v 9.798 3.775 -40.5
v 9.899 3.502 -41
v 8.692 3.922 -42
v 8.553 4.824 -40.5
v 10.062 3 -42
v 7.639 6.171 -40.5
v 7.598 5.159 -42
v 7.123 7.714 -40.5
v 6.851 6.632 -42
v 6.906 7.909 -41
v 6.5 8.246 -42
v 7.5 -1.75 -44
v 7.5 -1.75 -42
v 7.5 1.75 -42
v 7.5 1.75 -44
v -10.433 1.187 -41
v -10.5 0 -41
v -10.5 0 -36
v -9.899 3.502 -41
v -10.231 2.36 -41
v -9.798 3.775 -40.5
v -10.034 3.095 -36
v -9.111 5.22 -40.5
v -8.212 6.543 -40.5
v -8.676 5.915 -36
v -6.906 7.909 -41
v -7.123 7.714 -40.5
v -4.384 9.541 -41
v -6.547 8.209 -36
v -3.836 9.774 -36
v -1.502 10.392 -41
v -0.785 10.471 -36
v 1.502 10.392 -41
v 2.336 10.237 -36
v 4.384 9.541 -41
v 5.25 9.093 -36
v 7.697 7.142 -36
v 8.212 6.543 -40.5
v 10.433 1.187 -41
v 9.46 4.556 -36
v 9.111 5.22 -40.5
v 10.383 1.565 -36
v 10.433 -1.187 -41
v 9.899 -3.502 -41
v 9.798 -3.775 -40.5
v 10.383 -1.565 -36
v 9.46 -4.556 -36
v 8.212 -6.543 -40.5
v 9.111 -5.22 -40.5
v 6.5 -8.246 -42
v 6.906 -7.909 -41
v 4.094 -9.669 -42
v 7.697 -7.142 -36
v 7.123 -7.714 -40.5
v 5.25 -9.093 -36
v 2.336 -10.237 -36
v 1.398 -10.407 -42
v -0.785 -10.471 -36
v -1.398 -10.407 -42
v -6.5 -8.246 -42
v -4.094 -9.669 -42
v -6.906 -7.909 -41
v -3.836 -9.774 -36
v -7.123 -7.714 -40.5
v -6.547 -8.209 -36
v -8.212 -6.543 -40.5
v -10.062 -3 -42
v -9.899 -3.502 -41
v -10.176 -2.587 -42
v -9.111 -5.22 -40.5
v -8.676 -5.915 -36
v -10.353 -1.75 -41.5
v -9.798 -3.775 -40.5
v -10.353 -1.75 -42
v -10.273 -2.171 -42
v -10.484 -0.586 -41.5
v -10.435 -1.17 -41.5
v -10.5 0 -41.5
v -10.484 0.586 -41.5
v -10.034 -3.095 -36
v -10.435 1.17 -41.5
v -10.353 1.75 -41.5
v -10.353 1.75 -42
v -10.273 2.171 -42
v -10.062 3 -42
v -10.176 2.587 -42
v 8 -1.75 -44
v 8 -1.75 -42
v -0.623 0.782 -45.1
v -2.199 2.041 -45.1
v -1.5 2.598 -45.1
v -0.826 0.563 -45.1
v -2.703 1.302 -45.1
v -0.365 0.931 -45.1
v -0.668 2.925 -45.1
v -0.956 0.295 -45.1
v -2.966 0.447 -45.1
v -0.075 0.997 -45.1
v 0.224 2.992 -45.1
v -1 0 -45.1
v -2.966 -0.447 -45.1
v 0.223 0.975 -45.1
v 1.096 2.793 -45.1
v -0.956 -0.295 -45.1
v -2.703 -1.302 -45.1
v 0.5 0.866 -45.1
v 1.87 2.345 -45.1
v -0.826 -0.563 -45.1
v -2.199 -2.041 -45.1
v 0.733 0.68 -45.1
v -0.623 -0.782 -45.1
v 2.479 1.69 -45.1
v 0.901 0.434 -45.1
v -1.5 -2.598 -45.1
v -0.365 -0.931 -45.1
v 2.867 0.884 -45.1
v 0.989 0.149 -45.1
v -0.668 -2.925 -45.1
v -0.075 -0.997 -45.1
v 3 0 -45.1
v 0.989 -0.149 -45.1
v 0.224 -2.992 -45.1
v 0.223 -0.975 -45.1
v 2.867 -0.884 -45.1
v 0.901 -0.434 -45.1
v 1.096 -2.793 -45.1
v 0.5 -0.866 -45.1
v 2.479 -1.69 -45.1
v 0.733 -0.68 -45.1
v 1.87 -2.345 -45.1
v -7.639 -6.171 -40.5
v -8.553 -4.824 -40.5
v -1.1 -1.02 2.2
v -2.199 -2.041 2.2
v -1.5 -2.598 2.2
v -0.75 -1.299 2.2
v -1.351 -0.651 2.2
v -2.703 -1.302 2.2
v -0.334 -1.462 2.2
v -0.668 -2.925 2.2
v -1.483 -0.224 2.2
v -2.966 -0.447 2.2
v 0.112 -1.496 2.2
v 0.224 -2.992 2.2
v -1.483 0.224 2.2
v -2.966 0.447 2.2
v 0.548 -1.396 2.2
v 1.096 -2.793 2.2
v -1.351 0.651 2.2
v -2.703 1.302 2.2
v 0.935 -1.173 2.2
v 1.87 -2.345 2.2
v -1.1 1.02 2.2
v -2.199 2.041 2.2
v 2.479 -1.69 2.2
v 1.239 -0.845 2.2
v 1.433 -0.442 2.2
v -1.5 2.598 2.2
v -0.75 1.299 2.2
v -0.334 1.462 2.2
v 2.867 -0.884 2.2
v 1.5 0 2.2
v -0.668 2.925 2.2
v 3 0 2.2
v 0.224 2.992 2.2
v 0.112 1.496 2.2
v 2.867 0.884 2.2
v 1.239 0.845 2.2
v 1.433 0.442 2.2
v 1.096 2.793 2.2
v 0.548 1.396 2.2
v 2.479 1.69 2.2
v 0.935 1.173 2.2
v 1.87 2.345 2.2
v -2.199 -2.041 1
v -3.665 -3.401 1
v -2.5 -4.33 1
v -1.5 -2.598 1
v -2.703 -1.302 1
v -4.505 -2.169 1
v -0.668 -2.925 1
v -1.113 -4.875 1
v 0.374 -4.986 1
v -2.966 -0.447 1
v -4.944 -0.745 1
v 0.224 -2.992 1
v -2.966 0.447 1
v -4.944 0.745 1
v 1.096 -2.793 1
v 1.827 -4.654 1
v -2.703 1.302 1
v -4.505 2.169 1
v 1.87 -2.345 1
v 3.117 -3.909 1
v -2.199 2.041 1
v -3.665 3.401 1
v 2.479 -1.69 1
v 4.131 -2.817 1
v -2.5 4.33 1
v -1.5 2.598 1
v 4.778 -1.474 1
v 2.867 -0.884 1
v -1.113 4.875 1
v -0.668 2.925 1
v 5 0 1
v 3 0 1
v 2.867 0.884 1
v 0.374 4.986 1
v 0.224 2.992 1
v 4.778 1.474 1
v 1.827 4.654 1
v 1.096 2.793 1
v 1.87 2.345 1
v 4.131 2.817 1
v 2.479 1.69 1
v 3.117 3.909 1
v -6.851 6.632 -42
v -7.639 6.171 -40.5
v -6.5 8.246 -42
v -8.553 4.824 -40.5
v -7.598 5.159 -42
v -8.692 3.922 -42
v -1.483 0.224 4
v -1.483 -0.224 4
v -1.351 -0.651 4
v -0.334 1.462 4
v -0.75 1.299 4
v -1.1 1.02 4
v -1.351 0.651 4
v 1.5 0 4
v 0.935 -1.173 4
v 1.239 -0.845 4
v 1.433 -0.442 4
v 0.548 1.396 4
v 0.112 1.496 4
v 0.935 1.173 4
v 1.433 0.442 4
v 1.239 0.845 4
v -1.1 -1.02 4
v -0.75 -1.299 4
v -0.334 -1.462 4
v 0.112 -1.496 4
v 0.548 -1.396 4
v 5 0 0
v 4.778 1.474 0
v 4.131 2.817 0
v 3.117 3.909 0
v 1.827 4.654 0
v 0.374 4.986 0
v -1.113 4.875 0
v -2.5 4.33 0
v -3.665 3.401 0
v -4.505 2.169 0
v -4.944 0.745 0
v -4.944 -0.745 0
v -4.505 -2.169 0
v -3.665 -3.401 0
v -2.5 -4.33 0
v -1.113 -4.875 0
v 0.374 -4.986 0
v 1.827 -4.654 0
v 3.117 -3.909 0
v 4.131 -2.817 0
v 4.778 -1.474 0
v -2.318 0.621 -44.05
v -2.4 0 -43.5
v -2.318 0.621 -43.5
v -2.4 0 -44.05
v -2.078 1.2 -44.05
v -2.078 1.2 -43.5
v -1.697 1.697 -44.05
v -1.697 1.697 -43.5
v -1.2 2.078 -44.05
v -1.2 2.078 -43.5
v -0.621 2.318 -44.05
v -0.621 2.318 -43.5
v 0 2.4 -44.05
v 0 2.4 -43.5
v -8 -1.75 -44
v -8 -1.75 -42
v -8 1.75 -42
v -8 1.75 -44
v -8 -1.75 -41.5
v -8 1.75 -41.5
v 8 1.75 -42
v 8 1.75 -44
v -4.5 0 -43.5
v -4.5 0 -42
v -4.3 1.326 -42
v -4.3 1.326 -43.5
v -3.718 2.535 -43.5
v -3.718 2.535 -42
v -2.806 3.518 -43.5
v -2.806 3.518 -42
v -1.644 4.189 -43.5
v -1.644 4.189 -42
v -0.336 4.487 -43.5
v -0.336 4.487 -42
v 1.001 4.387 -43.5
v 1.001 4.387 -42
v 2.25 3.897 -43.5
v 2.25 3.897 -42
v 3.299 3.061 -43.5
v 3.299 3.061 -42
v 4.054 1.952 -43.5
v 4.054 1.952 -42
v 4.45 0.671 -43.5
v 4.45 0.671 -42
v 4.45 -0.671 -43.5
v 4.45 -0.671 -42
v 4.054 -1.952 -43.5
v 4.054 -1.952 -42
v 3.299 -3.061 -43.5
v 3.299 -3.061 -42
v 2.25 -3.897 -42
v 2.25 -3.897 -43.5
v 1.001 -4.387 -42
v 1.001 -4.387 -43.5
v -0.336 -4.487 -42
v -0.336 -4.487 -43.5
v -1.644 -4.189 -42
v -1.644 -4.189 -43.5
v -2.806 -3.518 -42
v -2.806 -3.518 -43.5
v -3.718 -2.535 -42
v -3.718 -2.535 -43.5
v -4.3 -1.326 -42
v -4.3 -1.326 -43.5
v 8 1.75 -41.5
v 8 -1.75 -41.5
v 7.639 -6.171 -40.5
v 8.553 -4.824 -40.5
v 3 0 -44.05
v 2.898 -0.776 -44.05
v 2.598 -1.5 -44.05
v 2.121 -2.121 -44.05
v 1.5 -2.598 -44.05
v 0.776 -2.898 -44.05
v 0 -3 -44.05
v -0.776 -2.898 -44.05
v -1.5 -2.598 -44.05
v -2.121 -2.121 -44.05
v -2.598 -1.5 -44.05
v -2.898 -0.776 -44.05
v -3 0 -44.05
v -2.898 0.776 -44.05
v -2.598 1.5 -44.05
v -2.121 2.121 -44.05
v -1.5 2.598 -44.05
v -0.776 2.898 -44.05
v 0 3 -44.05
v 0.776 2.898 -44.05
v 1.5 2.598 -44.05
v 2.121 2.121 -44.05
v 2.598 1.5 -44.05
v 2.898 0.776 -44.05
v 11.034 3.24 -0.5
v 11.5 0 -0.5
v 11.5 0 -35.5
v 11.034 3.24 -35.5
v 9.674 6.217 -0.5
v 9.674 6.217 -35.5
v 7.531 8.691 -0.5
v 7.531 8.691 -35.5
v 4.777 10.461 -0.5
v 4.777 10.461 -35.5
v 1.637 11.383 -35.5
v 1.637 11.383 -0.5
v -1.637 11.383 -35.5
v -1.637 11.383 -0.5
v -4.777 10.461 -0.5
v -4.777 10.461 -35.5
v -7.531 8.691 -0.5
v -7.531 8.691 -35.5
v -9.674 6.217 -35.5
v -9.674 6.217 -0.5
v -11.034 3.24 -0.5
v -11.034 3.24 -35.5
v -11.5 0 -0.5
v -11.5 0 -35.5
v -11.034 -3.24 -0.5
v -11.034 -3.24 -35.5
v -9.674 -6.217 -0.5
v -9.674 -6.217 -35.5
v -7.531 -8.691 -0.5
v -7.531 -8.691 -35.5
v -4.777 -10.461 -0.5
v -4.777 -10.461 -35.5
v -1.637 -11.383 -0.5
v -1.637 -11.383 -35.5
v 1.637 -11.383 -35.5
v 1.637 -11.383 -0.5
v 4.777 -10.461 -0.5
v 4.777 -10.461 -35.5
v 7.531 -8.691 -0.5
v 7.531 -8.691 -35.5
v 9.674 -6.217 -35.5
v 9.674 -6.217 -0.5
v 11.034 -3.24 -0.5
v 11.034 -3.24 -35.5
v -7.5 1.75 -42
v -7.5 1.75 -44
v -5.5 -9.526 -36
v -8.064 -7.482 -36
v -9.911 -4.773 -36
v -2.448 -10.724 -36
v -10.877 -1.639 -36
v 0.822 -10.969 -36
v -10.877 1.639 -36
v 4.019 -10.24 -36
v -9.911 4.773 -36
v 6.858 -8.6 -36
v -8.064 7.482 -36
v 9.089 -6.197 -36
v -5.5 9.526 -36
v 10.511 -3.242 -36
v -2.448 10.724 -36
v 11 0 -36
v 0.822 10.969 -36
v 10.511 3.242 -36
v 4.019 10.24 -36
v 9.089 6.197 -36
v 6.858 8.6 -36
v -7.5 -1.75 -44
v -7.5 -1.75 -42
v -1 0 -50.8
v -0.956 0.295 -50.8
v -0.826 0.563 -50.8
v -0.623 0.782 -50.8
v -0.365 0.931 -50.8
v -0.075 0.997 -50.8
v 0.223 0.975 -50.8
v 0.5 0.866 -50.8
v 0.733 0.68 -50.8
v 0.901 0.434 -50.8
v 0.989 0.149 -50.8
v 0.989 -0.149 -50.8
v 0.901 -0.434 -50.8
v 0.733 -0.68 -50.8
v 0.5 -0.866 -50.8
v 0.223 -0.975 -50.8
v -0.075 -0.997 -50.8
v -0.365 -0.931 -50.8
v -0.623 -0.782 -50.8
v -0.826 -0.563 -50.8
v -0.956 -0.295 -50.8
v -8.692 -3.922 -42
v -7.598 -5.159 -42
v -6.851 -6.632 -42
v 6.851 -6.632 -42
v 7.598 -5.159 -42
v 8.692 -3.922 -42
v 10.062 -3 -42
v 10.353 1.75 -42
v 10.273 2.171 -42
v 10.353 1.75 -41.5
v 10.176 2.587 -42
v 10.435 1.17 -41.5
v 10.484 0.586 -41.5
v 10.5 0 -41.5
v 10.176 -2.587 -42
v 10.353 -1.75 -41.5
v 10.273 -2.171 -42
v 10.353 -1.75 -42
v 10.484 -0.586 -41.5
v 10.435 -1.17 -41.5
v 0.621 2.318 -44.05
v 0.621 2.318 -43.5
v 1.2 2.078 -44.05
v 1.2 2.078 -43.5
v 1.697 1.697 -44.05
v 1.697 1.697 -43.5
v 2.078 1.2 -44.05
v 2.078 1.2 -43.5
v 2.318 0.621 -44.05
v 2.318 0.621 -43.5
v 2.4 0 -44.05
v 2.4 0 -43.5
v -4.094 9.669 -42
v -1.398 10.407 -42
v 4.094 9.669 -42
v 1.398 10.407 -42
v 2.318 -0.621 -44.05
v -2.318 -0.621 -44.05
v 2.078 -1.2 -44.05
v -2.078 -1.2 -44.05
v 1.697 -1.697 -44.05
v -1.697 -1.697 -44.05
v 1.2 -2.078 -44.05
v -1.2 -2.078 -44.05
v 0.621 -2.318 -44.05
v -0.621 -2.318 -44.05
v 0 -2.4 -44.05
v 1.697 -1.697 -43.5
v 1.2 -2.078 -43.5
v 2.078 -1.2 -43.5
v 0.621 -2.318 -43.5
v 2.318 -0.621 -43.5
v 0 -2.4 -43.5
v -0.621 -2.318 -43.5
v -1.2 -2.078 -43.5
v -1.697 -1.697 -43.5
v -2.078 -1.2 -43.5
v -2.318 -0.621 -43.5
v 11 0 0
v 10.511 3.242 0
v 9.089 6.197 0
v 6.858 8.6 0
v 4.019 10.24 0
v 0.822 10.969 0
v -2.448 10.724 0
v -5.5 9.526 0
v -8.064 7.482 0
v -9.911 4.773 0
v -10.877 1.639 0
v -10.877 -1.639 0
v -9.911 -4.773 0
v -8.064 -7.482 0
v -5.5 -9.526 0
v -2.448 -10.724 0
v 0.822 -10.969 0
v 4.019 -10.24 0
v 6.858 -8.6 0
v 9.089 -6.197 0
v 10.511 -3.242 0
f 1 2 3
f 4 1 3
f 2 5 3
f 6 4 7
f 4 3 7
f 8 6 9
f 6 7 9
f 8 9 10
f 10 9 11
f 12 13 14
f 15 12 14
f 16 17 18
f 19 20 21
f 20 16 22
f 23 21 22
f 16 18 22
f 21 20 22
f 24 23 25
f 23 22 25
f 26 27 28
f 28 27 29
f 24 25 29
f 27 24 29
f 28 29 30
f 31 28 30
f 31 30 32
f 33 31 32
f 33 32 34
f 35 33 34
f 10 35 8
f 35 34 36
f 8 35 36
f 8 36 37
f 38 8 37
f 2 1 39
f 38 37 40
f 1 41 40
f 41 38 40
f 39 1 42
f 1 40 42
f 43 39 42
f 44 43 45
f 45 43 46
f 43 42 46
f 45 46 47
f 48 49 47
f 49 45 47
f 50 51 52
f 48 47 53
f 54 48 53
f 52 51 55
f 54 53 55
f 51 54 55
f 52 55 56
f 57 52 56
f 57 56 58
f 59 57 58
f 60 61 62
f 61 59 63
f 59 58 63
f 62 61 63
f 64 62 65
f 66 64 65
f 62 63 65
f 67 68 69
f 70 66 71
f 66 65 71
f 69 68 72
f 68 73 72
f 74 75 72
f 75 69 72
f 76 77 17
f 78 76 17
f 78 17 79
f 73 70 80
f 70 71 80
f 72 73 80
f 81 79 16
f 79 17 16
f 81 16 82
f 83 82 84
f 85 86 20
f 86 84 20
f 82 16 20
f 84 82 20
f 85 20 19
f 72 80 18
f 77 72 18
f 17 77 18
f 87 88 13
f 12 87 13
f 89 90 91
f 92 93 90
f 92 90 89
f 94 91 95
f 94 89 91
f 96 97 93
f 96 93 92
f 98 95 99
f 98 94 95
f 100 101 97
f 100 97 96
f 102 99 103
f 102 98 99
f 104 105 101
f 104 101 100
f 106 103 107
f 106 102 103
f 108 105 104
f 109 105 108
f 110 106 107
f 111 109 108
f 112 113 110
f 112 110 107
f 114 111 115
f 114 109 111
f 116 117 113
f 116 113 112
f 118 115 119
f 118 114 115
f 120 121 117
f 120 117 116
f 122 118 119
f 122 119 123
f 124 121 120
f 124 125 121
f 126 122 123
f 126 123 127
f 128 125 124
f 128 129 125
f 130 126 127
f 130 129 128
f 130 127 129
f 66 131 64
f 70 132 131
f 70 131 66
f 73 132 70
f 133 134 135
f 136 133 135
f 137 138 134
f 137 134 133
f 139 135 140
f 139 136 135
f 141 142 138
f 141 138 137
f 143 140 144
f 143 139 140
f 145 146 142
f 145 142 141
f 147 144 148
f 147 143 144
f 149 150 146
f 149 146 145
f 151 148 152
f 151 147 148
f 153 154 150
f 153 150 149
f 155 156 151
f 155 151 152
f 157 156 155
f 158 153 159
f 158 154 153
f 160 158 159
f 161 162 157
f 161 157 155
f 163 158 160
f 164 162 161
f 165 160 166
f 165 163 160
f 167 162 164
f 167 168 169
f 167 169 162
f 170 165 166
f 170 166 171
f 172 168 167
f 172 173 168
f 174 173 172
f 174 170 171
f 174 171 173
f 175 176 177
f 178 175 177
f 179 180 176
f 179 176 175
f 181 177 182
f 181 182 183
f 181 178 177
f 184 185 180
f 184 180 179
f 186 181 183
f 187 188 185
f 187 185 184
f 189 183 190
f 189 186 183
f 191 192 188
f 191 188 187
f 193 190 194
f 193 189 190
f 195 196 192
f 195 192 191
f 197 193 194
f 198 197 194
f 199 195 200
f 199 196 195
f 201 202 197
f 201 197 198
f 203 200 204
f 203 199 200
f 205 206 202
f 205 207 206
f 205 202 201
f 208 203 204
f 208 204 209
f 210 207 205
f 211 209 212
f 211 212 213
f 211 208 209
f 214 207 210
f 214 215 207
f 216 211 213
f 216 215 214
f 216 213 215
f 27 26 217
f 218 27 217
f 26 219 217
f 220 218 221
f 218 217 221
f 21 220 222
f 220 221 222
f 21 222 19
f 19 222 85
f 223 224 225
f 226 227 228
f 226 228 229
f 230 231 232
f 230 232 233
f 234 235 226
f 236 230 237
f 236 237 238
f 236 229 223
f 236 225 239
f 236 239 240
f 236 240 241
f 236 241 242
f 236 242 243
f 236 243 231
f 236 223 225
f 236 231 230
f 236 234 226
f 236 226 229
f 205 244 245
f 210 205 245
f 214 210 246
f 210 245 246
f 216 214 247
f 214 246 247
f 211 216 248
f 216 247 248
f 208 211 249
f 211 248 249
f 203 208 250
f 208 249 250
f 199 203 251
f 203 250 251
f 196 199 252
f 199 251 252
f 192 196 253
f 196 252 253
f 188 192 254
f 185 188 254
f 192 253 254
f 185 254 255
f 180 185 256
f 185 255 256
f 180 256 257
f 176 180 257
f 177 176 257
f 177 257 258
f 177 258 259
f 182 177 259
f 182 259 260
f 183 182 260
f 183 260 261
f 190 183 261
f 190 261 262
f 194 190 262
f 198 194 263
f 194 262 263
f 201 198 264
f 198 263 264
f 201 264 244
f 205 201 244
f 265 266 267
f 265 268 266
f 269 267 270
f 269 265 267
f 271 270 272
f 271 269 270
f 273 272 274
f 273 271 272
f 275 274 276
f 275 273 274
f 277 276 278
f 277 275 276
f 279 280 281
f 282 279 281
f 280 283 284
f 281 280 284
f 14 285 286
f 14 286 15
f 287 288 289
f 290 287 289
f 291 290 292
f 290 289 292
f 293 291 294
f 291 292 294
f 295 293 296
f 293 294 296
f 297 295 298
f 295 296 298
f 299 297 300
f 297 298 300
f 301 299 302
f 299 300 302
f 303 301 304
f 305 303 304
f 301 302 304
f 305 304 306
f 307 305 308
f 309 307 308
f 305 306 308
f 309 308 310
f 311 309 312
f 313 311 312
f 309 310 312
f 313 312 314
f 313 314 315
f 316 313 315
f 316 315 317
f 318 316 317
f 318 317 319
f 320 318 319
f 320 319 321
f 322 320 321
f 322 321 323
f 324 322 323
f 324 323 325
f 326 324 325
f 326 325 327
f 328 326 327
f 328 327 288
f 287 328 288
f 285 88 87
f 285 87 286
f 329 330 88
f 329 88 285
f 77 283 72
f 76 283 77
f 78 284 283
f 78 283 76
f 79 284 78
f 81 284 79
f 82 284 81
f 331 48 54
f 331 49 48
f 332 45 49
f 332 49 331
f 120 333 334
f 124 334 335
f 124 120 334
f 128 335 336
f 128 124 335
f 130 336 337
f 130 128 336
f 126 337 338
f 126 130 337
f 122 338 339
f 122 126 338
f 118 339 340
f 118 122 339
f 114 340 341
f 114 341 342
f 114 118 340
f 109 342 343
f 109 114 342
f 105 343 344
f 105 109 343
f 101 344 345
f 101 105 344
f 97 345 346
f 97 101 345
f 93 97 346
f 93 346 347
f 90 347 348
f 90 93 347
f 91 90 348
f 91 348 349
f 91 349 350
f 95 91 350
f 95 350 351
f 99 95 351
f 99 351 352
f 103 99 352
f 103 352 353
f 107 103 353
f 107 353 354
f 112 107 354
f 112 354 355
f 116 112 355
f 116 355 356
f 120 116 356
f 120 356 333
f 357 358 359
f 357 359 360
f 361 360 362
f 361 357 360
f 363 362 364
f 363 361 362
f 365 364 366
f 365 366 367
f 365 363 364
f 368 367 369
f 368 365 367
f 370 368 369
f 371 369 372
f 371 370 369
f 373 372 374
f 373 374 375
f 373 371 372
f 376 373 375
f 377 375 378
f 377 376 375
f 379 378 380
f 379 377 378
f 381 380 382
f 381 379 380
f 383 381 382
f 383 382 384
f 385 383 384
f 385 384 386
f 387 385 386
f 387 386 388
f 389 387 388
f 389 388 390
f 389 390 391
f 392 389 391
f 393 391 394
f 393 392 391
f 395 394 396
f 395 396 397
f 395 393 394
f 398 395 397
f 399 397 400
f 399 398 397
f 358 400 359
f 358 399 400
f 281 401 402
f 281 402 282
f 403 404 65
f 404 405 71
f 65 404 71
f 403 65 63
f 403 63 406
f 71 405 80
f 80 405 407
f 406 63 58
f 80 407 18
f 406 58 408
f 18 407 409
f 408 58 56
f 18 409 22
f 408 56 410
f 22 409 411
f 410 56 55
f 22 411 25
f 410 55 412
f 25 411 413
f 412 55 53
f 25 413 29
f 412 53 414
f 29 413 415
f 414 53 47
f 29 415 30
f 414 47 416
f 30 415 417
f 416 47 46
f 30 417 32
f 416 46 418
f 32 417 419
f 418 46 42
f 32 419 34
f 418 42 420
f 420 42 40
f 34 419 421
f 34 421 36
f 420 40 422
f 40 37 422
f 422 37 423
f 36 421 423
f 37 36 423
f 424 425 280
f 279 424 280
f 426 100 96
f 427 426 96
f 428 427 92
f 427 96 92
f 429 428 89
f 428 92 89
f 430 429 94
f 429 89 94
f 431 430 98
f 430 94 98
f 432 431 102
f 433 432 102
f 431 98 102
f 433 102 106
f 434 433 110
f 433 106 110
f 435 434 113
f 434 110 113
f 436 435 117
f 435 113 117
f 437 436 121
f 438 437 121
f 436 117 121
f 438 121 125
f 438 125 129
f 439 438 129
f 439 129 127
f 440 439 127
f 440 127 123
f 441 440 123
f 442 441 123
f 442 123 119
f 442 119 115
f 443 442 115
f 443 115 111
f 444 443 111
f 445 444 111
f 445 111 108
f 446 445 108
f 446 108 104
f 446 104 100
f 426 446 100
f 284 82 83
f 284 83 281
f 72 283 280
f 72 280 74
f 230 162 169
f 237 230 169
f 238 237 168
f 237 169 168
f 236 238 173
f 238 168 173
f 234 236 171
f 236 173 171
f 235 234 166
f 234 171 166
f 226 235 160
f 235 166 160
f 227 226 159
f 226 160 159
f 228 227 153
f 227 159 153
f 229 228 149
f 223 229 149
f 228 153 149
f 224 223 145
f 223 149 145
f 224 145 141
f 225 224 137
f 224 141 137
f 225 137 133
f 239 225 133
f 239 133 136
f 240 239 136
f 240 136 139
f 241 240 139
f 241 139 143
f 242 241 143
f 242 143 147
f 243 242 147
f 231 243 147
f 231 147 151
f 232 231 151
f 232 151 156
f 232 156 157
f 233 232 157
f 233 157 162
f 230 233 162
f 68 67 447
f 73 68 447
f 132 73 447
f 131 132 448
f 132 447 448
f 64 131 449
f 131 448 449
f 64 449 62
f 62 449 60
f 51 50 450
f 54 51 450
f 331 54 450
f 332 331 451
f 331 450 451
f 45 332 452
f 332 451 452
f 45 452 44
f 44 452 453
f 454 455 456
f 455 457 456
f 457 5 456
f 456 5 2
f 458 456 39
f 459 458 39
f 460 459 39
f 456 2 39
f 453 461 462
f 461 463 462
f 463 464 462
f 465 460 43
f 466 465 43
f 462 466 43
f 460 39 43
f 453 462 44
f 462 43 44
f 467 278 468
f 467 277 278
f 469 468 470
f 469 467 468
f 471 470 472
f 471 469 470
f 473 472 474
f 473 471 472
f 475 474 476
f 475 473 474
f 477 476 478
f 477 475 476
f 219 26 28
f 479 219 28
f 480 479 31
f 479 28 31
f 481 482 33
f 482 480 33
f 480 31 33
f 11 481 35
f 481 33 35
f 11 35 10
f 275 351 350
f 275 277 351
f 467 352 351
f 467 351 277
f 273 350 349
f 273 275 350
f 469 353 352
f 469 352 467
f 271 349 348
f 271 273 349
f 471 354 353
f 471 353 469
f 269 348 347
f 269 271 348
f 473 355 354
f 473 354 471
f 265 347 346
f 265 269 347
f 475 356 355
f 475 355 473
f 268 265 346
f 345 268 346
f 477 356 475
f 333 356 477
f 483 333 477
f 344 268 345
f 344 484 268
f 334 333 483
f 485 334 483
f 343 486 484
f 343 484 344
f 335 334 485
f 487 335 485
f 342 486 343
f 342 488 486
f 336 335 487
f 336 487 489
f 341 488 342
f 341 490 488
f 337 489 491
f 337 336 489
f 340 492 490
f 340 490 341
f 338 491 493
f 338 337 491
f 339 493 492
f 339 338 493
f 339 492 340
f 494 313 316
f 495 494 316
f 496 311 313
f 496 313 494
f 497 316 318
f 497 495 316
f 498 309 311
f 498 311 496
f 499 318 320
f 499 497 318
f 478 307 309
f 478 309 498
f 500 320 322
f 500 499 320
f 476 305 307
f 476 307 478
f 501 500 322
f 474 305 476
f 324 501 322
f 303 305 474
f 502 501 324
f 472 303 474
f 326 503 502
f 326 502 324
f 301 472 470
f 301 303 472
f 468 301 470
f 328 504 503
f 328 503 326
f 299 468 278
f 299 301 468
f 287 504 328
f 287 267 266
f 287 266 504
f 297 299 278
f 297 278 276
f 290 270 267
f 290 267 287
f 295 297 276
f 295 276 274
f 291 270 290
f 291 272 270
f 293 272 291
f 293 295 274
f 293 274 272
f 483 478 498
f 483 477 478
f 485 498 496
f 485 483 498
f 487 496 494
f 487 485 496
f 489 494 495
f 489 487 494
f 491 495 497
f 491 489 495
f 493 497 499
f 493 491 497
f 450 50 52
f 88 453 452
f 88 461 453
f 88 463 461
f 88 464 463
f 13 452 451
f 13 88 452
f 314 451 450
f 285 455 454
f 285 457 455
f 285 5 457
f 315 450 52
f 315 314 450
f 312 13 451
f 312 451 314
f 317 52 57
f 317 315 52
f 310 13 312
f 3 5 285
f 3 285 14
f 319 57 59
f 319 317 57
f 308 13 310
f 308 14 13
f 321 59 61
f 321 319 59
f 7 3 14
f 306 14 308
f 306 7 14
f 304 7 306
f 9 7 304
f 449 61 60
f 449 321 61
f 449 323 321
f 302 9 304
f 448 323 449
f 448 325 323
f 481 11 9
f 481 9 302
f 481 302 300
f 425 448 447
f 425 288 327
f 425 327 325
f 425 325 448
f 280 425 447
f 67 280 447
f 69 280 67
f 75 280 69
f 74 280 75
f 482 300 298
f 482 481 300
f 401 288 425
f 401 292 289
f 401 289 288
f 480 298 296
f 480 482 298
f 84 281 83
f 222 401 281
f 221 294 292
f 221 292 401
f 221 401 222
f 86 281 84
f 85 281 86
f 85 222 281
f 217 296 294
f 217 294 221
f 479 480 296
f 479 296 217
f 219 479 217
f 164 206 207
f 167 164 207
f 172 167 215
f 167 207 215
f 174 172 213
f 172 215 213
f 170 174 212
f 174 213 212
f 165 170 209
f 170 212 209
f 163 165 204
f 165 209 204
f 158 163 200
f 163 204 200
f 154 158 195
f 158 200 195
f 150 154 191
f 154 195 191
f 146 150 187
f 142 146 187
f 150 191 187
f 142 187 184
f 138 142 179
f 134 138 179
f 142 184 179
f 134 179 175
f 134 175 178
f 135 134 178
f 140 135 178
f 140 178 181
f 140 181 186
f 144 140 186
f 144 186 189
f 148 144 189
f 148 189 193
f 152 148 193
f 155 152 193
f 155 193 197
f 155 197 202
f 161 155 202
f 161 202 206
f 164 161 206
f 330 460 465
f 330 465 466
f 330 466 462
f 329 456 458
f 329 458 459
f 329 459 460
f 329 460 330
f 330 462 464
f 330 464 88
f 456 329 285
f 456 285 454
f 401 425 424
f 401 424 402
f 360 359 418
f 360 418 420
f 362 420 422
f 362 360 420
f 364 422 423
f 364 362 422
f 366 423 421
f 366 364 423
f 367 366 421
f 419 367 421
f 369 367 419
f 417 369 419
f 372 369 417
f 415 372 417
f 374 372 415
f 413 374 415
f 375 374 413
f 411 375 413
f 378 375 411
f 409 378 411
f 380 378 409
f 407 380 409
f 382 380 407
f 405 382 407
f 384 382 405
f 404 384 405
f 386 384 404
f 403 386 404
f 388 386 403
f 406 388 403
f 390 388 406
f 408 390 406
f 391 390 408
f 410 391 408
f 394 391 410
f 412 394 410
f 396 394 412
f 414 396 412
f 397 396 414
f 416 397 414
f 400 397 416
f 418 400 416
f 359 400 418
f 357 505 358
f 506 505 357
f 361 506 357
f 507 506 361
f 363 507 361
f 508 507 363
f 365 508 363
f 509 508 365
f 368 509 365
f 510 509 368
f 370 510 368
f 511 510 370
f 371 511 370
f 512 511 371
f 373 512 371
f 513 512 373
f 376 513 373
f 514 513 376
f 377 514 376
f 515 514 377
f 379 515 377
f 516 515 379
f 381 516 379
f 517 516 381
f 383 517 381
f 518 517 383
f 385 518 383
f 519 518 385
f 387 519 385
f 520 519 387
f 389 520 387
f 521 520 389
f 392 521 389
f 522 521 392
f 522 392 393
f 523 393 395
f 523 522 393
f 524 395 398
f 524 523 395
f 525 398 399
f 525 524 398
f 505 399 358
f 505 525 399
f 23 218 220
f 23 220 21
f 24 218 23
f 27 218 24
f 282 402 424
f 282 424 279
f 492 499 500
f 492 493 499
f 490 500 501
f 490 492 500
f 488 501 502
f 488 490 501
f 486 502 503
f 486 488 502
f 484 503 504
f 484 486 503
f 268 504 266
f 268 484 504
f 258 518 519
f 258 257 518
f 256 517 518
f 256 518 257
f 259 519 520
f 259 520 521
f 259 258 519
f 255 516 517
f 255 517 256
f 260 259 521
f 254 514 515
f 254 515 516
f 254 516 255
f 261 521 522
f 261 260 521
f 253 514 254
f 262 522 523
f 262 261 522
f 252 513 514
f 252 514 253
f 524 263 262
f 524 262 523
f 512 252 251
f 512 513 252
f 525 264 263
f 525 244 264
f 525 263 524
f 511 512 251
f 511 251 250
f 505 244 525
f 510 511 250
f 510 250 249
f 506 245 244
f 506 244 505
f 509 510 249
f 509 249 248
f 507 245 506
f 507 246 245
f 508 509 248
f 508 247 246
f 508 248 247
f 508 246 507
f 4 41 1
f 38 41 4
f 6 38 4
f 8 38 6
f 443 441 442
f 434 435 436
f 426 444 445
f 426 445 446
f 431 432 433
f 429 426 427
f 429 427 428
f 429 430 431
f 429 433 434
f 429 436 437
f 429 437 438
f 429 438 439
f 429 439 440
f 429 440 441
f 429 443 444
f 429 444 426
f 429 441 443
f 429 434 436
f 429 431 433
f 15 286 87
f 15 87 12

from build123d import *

# Parameters (mm, degrees)
CROQUIS1_R                      = 11.5
SALIENTE_EXTRUIR1_DEPTH         = 36
CROQUIS1_4_R                    = 5
SALIENTE_EXTRUIR2_DEPTH         = 1
CROQUIS1_5_R                    = 3
SALIENTE_EXTRUIR3_DEPTH         = 2.2
CROQUIS1_6_R                    = 1.5
SALIENTE_EXTRUIR4_DEPTH         = 4
CROQUIS3_R                      = 10.5
SALIENTE_EXTRUIR5_DEPTH         = 5
CROQUIS7_R                      = 10.5
SALIENTE_EXTRUIR10_DEPTH        = 1
CROQUIS3_6_R                    = 1
SALIENTE_EXTRUIR7_DEPTH         = 14.8
SALIENTE_EXTRUIR8_START         = 9.1
CROQUIS3_8_R                    = 3
SALIENTE_EXTRUIR8_DEPTH         = 9.1
CROQUIS3_9_R                    = 4.5
SALIENTE_EXTRUIR9_DEPTH         = 7.5
CROQUIS5_W                      = 0.55
CROQUIS5_H                      = 0.6
CORTAR_EXTRUIR1_DEPTH           = 1.5
CORTAR_EXTRUIR1_DRAFT           = -20
CORTAR_EXTRUIR1_PROFILE_2_DEPTH = 1.5
CORTAR_EXTRUIR1_PROFILE_2_DRAFT = -20
CORTAR_EXTRUIR1_PROFILE_3_DEPTH = 1.5
CORTAR_EXTRUIR1_PROFILE_3_DRAFT = -20
CORTAR_EXTRUIR1_PROFILE_4_DEPTH = 1.5
CORTAR_EXTRUIR1_PROFILE_4_DRAFT = -20
CHAFL_N1_SIZE                   = 0.5
CORTAR_EXTRUIR2_START           = -0.5
CORTAR_EXTRUIR2_DEPTH           = 0.5
CROQUIS10_W                     = 0.5
CROQUIS10_H                     = 3.5
SALIENTE_EXTRUIR11_DEPTH        = 2.5


with BuildPart() as part:
    # Croquis1 → Saliente-Extruir1 (new body)
    with BuildSketch(Plane.XY):
        Circle(CROQUIS1_R)
    extrude(amount=-SALIENTE_EXTRUIR1_DEPTH)

    # Croquis1<4> → Saliente-Extruir2 (add)
    with BuildSketch(Plane.XY):
        Circle(CROQUIS1_4_R)
    extrude(amount=SALIENTE_EXTRUIR2_DEPTH)

    # Croquis1<5> → Saliente-Extruir3 (add)
    with BuildSketch(Plane.XY):
        Circle(CROQUIS1_5_R)
    extrude(amount=SALIENTE_EXTRUIR3_DEPTH)

    # Croquis1<6> → Saliente-Extruir4 (add)
    with BuildSketch(Plane.XY):
        Circle(CROQUIS1_6_R)
    extrude(amount=SALIENTE_EXTRUIR4_DEPTH)

    # Croquis3 → Saliente-Extruir5 (add)
    with BuildSketch(Plane(origin=(0, 0, -36), x_dir=(-1, 0, 0), z_dir=(0, 0, -1))):
        Circle(CROQUIS3_R)
    extrude(amount=SALIENTE_EXTRUIR5_DEPTH)

    # Croquis3<6> → Saliente-Extruir7 (add)
    with BuildSketch(Plane(origin=(0, 0, -36), x_dir=(-1, 0, 0), z_dir=(0, 0, -1))):
        Circle(CROQUIS3_6_R)
    extrude(amount=SALIENTE_EXTRUIR7_DEPTH)

    # Croquis3<8> → Saliente-Extruir8 (add)
    with BuildSketch(Plane(origin=(0, 0, -36), x_dir=(-1, 0, 0), z_dir=(0, 0, -1)).offset(SALIENTE_EXTRUIR8_START)):
        with Locations(Location((0, 0, 0), (0, 0, 180))):
            Circle(CROQUIS3_8_R)
    extrude(amount=-SALIENTE_EXTRUIR8_DEPTH)

    # Croquis3<9> → Saliente-Extruir9 (add)
    with BuildSketch(Plane(origin=(0, 0, -36), x_dir=(-1, 0, 0), z_dir=(0, 0, -1))):
        Circle(CROQUIS3_9_R)
    extrude(amount=SALIENTE_EXTRUIR9_DEPTH)

    # Cortar-Barrer1: sweep along a curve in space
    with BuildLine() as cortar_barrer1_path:
        ThreePointArc((-3, 0, -45.1), (-2.121320344, 2.121320344, -45.1), (0, 3, -45.1))
        ThreePointArc((0, 3, -45.1), (2.121320344, 2.121320344, -45.1), (3, 0, -45.1))
        ThreePointArc((3, 0, -45.1), (2.121320344, -2.121320344, -45.1), (0, -3, -45.1))
        ThreePointArc((0, -3, -45.1), (-2.121320344, -2.121320344, -45.1), (-3, 0, -45.1))
    # Croquis5 → Cortar-Barrer1 (sweep, cut)
    with BuildSketch(Plane(origin=(0, 0, 0), x_dir=(0, 0, -1), z_dir=(1, 0, 0))):
        with Locations((43.775, 2.7)):
            Rectangle(CROQUIS5_W, CROQUIS5_H)
    sweep(path=cortar_barrer1_path.line, mode=Mode.SUBTRACT)


with BuildPart() as body_2:
    # Croquis7 → Saliente-Extruir10 (new body)
    with BuildSketch(Plane(origin=(0, 0, -41), x_dir=(-1, 0, 0), z_dir=(0, 0, -1))):
        Circle(CROQUIS7_R)
    extrude(amount=SALIENTE_EXTRUIR10_DEPTH)


with BuildPart() as cortar_extruir1_tool:
    # Croquis8 → Cortar-Extruir1 (with draft: the straight prism first)
    with BuildSketch(Plane(origin=(0, 0, -42), x_dir=(-1, 0, 0), z_dir=(0, 0, -1))):
        with BuildLine():
            ThreePointArc((-6.51000025, -9.479973457), (-7.597986649, -5.15921898), (-11.212760015, -2.554214724))
            ThreePointArc((-11.212760015, -2.554214724), (-9.513968223, -6.460217384), (-6.51000025, -9.479973457))
        make_face()
    extrude(amount=-CORTAR_EXTRUIR1_DEPTH)
    # Cortar-Extruir1: the draft: its side faces are tilted about the plane it starts from
    cortar_extruir1_sides = [cortar_extruir1_tool.faces().sort_by_distance(p)[0] for p in [
        (7.597986649, -5.15921898, -41.25),
        (9.513968223, -6.460217384, -41.25),
    ]]
    draft(cortar_extruir1_sides, Plane(origin=(0, 0, -42), x_dir=(-1, 0, 0), z_dir=(0, 0, -1)), CORTAR_EXTRUIR1_DRAFT)


with BuildPart() as part_1:
    add(part.part)

    # Cortar-Extruir1: cut by cortar_extruir1_tool
    add(cortar_extruir1_tool.part, mode=Mode.SUBTRACT)


with BuildPart() as body_2_1:
    add(body_2.part)

    # Cortar-Extruir1: cut by cortar_extruir1_tool
    add(cortar_extruir1_tool.part, mode=Mode.SUBTRACT)


with BuildPart() as cortar_extruir1_profile_2_tool:
    # Croquis8 → Cortar-Extruir1 profile 2 (with draft: the straight prism first)
    with BuildSketch(Plane(origin=(0, 0, -42), x_dir=(-1, 0, 0), z_dir=(0, 0, -1))):
        with BuildLine():
            ThreePointArc((-6.51000025, 9.479973457), (-9.513968223, 6.460217384), (-11.212760015, 2.554214724))
            ThreePointArc((-11.212760015, 2.554214724), (-7.597986649, 5.15921898), (-6.51000025, 9.479973457))
        make_face()
    extrude(amount=-CORTAR_EXTRUIR1_PROFILE_2_DEPTH)
    # Cortar-Extruir1 profile 2: the draft: its side faces are tilted about the plane it starts from
    cortar_extruir1_profile_2_sides = [cortar_extruir1_profile_2_tool.faces().sort_by_distance(p)[0] for p in [
        (9.513968223, 6.460217384, -41.25),
        (7.597986649, 5.15921898, -41.25),
    ]]
    draft(cortar_extruir1_profile_2_sides, Plane(origin=(0, 0, -42), x_dir=(-1, 0, 0), z_dir=(0, 0, -1)), CORTAR_EXTRUIR1_PROFILE_2_DRAFT)


with BuildPart() as part_2:
    add(part_1.part)

    # Cortar-Extruir1 profile 2: cut by cortar_extruir1_profile_2_tool
    add(cortar_extruir1_profile_2_tool.part, mode=Mode.SUBTRACT)


with BuildPart() as body_2_2:
    add(body_2_1.part)

    # Cortar-Extruir1 profile 2: cut by cortar_extruir1_profile_2_tool
    add(cortar_extruir1_profile_2_tool.part, mode=Mode.SUBTRACT)


with BuildPart() as cortar_extruir1_profile_3_tool:
    # Croquis8 → Cortar-Extruir1 profile 3 (with draft: the straight prism first)
    with BuildSketch(Plane(origin=(0, 0, -42), x_dir=(-1, 0, 0), z_dir=(0, 0, -1))):
        with BuildLine():
            ThreePointArc((6.51000025, 9.479973457), (7.597986649, 5.15921898), (11.212760015, 2.554214724))
            ThreePointArc((11.212760015, 2.554214724), (9.513968223, 6.460217384), (6.51000025, 9.479973457))
        make_face()
    extrude(amount=-CORTAR_EXTRUIR1_PROFILE_3_DEPTH)
    # Cortar-Extruir1 profile 3: the draft: its side faces are tilted about the plane it starts from
    cortar_extruir1_profile_3_sides = [cortar_extruir1_profile_3_tool.faces().sort_by_distance(p)[0] for p in [
        (-9.513968223, 6.460217384, -41.25),
        (-7.597986649, 5.15921898, -41.25),
    ]]
    draft(cortar_extruir1_profile_3_sides, Plane(origin=(0, 0, -42), x_dir=(-1, 0, 0), z_dir=(0, 0, -1)), CORTAR_EXTRUIR1_PROFILE_3_DRAFT)


with BuildPart() as part_3:
    add(part_2.part)

    # Cortar-Extruir1 profile 3: cut by cortar_extruir1_profile_3_tool
    add(cortar_extruir1_profile_3_tool.part, mode=Mode.SUBTRACT)


with BuildPart() as body_2_3:
    add(body_2_2.part)

    # Cortar-Extruir1 profile 3: cut by cortar_extruir1_profile_3_tool
    add(cortar_extruir1_profile_3_tool.part, mode=Mode.SUBTRACT)


with BuildPart() as cortar_extruir1_profile_4_tool:
    # Croquis8 → Cortar-Extruir1 profile 4 (with draft: the straight prism first)
    with BuildSketch(Plane(origin=(0, 0, -42), x_dir=(-1, 0, 0), z_dir=(0, 0, -1))):
        with BuildLine():
            ThreePointArc((6.51000025, -9.479973457), (9.513968223, -6.460217384), (11.212760015, -2.554214724))
            ThreePointArc((11.212760015, -2.554214724), (7.597986649, -5.15921898), (6.51000025, -9.479973457))
        make_face()
    extrude(amount=-CORTAR_EXTRUIR1_PROFILE_4_DEPTH)
    # Cortar-Extruir1 profile 4: the draft: its side faces are tilted about the plane it starts from
    cortar_extruir1_profile_4_sides = [cortar_extruir1_profile_4_tool.faces().sort_by_distance(p)[0] for p in [
        (-7.597986649, -5.15921898, -41.25),
        (-9.513968223, -6.460217384, -41.25),
    ]]
    draft(cortar_extruir1_profile_4_sides, Plane(origin=(0, 0, -42), x_dir=(-1, 0, 0), z_dir=(0, 0, -1)), CORTAR_EXTRUIR1_PROFILE_4_DRAFT)


with BuildPart() as part_4:
    add(part_3.part)

    # Cortar-Extruir1 profile 4: cut by cortar_extruir1_profile_4_tool
    add(cortar_extruir1_profile_4_tool.part, mode=Mode.SUBTRACT)

    # Chaflán1
    chafl_n1_edges = [part_4.edges().sort_by_distance(p)[0] for p in [
        (-11.5, 0, 0),
        (-11.5, 0, -36),
    ]]
    chamfer(chafl_n1_edges, length=CHAFL_N1_SIZE)



with BuildPart() as body_2_4:
    add(body_2_3.part)

    # Cortar-Extruir1 profile 4: cut by cortar_extruir1_profile_4_tool
    add(cortar_extruir1_profile_4_tool.part, mode=Mode.SUBTRACT)

    # Croquis9 → Cortar-Extruir2 (cut)
    with BuildSketch(Plane(origin=(0, 0, -42), x_dir=(-1, 0, 0), z_dir=(0, 0, -1)).offset(CORTAR_EXTRUIR2_START)):
        with BuildLine():
            Line((-10.35313962, -1.75), (-8, -1.75))
            Line((-8, -1.75), (-7.5, -1.75))
            Line((-7.5, -1.75), (-7.5, 1.75))
            Line((-7.5, 1.75), (-8, 1.75))
            Line((-8, 1.75), (-10.35313962, 1.75))
            ThreePointArc((-10.35313962, 1.75), (-10.463220489, 0.878075733), (-10.5, 0))
            ThreePointArc((-10.5, 0), (-10.463220489, -0.878075733), (-10.35313962, -1.75))
        make_face()
        with BuildLine():
            Line((7.5, -1.75), (8, -1.75))
            Line((8, -1.75), (10.35313962, -1.75))
            ThreePointArc((10.35313962, -1.75), (10.463220489, -0.878075733), (10.5, 0))
            ThreePointArc((10.5, 0), (10.463220489, 0.878075733), (10.35313962, 1.75))
            Line((10.35313962, 1.75), (8, 1.75))
            Line((8, 1.75), (7.5, 1.75))
            Line((7.5, 1.75), (7.5, -1.75))
        make_face()
    extrude(amount=CORTAR_EXTRUIR2_DEPTH, mode=Mode.SUBTRACT)


with BuildPart() as part_5:
    add(part_4.part)

    add(body_2_4.part)  # Saliente-Extruir11 merges body 2
    # Croquis10 → Saliente-Extruir11 (add)
    with BuildSketch(Plane(origin=(0, 0, -41.5), x_dir=(-1, 0, 0), z_dir=(0, 0, -1))):
        with Locations((7.75, 0)):
            Rectangle(CROQUIS10_W, CROQUIS10_H)
        with Locations((-7.75, 0)):
            Rectangle(CROQUIS10_W, CROQUIS10_H)
    extrude(amount=SALIENTE_EXTRUIR11_DEPTH)


solid = part_5.part
